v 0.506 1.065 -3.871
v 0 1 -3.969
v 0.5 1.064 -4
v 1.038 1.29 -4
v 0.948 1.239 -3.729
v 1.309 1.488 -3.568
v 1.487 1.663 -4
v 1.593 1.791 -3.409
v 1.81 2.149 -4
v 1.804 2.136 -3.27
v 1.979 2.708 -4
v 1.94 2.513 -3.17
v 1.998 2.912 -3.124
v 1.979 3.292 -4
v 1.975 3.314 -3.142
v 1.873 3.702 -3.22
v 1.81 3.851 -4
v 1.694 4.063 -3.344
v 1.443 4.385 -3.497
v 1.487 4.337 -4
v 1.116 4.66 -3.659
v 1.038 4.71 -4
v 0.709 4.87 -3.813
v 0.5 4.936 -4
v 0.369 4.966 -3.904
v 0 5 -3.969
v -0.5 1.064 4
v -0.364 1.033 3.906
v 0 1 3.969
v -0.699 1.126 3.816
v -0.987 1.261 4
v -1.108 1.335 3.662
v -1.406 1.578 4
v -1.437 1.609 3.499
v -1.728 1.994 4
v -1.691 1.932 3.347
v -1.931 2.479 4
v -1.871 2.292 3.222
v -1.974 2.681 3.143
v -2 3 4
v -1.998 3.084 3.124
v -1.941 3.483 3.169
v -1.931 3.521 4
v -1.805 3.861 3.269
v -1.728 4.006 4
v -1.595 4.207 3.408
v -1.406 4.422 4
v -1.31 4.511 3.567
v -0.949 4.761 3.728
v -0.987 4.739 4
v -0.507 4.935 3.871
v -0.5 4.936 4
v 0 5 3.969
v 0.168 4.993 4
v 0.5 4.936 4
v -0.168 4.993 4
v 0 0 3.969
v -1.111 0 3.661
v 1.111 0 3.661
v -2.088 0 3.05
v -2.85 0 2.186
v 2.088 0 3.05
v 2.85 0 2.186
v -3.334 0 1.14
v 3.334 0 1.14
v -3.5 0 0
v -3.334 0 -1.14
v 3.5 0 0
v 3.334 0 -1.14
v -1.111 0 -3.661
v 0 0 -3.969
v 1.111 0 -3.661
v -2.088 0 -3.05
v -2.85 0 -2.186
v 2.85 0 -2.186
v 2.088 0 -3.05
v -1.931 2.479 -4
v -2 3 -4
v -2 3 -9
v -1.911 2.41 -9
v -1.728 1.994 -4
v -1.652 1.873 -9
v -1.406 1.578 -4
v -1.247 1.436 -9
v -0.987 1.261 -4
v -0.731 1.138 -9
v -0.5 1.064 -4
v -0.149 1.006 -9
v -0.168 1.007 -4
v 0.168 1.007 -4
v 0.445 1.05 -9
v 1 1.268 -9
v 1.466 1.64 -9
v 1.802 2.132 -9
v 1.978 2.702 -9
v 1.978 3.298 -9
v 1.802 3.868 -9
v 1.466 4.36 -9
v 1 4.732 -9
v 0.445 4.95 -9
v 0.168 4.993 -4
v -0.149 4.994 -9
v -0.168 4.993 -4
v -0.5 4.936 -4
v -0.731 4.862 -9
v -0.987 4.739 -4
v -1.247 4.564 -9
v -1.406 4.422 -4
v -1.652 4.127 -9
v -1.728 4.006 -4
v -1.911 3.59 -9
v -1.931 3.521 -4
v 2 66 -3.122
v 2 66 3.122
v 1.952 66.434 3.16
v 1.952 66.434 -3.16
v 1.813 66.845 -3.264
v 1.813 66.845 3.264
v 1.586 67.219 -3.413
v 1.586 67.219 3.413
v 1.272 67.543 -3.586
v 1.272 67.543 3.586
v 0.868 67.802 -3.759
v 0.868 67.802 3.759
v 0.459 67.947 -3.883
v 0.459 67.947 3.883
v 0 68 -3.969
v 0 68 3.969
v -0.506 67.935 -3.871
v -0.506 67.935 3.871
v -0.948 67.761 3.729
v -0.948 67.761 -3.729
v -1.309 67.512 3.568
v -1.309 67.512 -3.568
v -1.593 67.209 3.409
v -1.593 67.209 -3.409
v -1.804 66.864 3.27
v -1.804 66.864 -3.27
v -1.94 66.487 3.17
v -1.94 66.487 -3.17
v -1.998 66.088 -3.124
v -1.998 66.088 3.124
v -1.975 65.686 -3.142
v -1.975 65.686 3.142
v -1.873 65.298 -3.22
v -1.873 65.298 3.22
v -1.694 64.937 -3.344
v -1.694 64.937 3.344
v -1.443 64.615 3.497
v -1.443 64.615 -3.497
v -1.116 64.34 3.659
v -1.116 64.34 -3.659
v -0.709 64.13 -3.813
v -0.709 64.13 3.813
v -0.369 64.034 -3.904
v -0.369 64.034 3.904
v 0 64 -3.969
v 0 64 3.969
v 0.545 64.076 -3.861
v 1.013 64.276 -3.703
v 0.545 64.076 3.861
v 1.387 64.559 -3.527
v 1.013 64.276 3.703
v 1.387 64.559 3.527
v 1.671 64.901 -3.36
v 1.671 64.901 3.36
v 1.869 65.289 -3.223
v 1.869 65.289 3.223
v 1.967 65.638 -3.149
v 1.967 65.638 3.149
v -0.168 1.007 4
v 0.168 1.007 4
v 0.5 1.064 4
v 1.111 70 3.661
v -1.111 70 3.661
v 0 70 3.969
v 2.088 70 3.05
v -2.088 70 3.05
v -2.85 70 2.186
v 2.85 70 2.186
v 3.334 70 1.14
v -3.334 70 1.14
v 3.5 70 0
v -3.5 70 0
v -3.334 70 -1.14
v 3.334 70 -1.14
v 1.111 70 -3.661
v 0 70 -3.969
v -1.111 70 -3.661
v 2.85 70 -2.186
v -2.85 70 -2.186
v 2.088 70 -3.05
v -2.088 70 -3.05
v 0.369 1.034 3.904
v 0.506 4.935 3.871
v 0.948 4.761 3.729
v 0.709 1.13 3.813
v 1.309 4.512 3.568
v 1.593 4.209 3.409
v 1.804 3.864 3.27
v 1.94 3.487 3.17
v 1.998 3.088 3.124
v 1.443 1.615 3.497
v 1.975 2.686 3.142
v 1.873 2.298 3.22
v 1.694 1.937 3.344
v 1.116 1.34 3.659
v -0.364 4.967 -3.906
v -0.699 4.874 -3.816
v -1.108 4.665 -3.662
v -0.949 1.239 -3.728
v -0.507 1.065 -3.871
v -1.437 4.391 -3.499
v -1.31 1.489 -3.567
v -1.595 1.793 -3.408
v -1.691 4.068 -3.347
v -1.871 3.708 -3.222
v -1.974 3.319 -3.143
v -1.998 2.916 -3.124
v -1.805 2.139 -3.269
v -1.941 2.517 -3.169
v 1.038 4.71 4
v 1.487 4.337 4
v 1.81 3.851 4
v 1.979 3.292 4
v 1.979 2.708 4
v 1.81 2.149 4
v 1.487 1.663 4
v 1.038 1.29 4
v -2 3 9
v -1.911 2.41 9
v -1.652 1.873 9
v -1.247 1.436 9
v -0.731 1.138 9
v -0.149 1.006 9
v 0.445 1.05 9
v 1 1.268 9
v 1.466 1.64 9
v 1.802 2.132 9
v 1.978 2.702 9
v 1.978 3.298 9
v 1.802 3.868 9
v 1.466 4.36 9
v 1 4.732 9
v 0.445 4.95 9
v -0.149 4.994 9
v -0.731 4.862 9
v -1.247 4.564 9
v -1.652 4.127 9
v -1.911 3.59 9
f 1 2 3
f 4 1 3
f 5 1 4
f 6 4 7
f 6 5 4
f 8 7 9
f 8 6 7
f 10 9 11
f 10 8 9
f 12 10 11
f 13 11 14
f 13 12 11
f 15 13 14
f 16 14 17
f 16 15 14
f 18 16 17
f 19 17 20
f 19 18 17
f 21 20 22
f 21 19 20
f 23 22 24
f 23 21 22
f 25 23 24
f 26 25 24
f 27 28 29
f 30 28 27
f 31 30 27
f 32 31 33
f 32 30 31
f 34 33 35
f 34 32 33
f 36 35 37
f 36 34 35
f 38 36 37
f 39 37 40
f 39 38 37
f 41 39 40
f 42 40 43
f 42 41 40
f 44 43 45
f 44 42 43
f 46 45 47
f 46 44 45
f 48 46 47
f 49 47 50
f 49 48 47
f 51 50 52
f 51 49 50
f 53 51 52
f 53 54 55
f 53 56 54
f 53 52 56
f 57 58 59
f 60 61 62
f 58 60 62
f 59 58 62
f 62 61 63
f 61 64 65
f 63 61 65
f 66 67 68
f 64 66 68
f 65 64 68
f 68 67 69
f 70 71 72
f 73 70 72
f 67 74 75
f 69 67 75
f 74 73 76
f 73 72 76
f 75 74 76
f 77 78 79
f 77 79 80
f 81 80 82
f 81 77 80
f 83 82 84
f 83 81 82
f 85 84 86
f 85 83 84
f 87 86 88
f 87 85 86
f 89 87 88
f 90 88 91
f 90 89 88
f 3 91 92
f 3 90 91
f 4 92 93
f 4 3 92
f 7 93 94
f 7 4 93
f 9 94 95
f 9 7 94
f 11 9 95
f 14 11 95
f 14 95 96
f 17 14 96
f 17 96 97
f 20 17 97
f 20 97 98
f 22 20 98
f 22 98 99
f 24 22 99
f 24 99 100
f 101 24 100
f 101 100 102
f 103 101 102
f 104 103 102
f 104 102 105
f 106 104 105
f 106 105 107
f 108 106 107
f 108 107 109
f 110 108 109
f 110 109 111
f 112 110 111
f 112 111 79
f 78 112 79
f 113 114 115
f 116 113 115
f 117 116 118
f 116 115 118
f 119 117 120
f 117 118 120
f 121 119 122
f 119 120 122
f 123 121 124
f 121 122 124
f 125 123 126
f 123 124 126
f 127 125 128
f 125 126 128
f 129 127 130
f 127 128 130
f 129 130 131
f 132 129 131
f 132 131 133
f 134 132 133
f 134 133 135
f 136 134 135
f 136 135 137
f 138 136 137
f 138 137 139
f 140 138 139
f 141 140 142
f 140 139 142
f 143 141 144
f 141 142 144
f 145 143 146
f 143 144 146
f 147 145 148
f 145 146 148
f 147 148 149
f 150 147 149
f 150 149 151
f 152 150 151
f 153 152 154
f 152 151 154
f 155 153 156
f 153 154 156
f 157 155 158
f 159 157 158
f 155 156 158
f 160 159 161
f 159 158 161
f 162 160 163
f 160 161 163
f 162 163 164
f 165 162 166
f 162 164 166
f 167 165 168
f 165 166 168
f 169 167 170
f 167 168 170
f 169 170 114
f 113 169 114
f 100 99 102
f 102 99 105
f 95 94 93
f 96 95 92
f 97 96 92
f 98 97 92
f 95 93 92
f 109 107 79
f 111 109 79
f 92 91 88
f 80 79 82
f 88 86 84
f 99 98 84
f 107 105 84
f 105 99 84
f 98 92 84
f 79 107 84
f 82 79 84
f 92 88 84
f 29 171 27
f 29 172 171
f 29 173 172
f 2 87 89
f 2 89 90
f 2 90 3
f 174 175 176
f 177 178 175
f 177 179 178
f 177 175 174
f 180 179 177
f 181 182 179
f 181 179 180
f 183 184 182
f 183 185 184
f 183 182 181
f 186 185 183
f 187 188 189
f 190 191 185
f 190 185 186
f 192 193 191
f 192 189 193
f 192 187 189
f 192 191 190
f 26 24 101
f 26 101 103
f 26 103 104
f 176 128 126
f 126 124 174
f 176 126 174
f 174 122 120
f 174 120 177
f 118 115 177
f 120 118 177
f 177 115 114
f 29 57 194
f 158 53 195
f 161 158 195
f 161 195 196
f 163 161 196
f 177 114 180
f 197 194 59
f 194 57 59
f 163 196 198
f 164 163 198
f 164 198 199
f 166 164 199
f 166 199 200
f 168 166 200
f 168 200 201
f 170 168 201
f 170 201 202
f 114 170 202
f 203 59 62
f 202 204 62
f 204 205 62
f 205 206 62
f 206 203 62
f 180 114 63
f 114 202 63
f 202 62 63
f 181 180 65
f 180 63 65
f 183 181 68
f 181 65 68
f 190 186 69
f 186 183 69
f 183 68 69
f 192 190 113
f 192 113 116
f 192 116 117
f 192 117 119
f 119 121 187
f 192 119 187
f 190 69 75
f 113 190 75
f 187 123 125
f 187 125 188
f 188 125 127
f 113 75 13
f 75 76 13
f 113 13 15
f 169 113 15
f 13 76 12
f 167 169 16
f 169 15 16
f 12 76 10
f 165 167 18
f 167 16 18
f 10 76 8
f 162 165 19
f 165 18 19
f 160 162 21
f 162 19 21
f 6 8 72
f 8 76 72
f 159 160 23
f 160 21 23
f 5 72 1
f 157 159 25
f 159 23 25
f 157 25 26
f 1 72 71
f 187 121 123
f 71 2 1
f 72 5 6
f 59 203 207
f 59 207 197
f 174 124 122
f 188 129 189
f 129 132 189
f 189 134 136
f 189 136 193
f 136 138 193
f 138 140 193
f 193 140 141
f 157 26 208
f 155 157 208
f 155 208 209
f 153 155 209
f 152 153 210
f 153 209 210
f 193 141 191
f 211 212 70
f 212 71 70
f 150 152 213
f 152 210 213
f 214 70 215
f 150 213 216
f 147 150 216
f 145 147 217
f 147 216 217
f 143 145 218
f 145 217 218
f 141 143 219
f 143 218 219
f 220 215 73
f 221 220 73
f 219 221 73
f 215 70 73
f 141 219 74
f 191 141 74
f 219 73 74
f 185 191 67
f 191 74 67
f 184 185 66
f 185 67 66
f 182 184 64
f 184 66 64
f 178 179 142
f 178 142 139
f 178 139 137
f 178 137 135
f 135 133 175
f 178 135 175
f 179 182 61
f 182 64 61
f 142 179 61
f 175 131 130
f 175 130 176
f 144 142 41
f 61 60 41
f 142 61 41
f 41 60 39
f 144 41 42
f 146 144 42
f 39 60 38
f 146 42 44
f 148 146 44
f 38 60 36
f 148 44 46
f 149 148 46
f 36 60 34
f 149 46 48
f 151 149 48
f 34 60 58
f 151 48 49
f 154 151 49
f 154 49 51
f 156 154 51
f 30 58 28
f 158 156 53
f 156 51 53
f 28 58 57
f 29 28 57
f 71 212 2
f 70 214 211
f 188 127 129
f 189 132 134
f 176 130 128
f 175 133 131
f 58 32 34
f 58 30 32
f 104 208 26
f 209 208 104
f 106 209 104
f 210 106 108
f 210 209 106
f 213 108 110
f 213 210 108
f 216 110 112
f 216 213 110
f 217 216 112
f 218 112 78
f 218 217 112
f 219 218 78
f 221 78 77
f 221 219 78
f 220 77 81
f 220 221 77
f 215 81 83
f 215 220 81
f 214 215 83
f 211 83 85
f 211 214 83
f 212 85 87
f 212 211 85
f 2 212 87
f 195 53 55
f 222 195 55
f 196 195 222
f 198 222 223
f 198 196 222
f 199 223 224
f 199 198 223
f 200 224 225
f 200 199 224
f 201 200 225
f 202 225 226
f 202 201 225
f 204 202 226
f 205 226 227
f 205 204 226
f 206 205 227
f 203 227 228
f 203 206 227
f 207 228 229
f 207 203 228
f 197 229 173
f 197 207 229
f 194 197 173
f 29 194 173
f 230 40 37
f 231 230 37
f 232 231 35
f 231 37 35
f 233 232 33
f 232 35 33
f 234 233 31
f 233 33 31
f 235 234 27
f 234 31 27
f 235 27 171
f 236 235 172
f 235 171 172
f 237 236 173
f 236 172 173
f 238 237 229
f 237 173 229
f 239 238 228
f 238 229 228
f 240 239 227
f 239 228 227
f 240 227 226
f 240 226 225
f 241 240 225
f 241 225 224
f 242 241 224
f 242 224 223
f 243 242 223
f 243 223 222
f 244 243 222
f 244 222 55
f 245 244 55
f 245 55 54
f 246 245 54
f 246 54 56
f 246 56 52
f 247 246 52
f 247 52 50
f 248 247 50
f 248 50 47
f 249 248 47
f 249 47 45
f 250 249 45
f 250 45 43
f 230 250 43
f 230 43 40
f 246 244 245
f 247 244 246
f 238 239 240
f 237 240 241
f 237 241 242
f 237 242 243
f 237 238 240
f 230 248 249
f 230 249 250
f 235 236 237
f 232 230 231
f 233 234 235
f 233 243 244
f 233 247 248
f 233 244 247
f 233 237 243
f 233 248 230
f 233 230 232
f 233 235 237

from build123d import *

# Parameters (mm, degrees)
SKETCH2_W           = 7
SKETCH2_H           = 8
BOSS_EXTRUDE1_DEPTH = 70
SKETCH3_R           = 2
BOSS_EXTRUDE2_DEPTH = 5
CUT_EXTRUDE1_REACH  = 73.283
SKETCH4_R           = 2
FILLET1_R           = 4


with BuildPart() as part:
    # Sketch2 → Boss-Extrude1 (new body)
    with BuildSketch(Plane(origin=(0, 0, 0), x_dir=(1, 0, 0), z_dir=(0, 1, 0))):
        Rectangle(SKETCH2_W, SKETCH2_H)
    extrude(amount=BOSS_EXTRUDE1_DEPTH)

    # Sketch3 → Boss-Extrude2 (add)
    with BuildSketch(Plane.XY.offset(4)):
        with Locations(Location((0, 3, 0), (0, 0, 180))):
            Circle(SKETCH3_R)
    boss_extrude2 = extrude(amount=BOSS_EXTRUDE2_DEPTH)

    # Mirror1: Boss-Extrude2 across plane
    add(boss_extrude2.mirror(Plane.XY))

    # Sketch4 → Cut-Extrude1 (cut, up to next)
    with BuildSketch(Plane.XY.offset(4), mode=Mode.PRIVATE) as cut_extrude1_sk1:
        with Locations((0, 66)):
            Circle(SKETCH4_R)
    cut_extrude1_tool1 = extrude(cut_extrude1_sk1.sketch, amount=-CUT_EXTRUDE1_REACH, mode=Mode.PRIVATE) & part.part
    add(cut_extrude1_tool1.solids().sort_by_distance((0, 66, 4))[0], mode=Mode.SUBTRACT)

    # Fillet1
    # the kernel refuses this fillet: 4 mm, written as the material it takes off along each edge
    with BuildSketch(Plane(origin=(-3.5, -10, 4), x_dir=(0, 0, -1), z_dir=(0, 1, 0))) as fillet1_piece_1_section:
        with BuildLine():
            CenterArc((FILLET1_R, -FILLET1_R), FILLET1_R, 90, 90)
            Line((0, -FILLET1_R), (0, 0))
            Line((0, 0), (FILLET1_R, 0))
        make_face()
    fillet1_piece_1 = extrude(amount=90, mode=Mode.PRIVATE)
    fillet1_piece_1 = fillet1_piece_1 - Plane(origin=(0, 3, 3.08936477), x_dir=(-1, 0, 0), z_dir=(0, 0, -1)) * Cylinder(2, 196, mode=Mode.PRIVATE)
    add(fillet1_piece_1, mode=Mode.SUBTRACT)
    with BuildSketch(Plane(origin=(-3.5, -10, -4), x_dir=(1, 0, 0), z_dir=(0, 1, 0))) as fillet1_piece_2_section:
        with BuildLine():
            CenterArc((FILLET1_R, -FILLET1_R), FILLET1_R, 90, 90)
            Line((0, -FILLET1_R), (0, 0))
            Line((0, 0), (FILLET1_R, 0))
        make_face()
    fillet1_piece_2 = extrude(amount=90, mode=Mode.PRIVATE)
    fillet1_piece_2 = fillet1_piece_2 - Plane(origin=(0, 3, -3.089364757), x_dir=(-1, 0, 0), z_dir=(0, 0, 1)) * Cylinder(2, 196, mode=Mode.PRIVATE)
    add(fillet1_piece_2, mode=Mode.SUBTRACT)
    with BuildSketch(Plane(origin=(3.5, -10, -4), x_dir=(-1, 0, 0), z_dir=(0, 1, 0))) as fillet1_piece_3_section:
        with BuildLine():
            CenterArc((FILLET1_R, FILLET1_R), FILLET1_R, 180, 90)
            Line((0, FILLET1_R), (0, 0))
            Line((0, 0), (FILLET1_R, 0))
        make_face()
    fillet1_piece_3 = extrude(amount=90, mode=Mode.PRIVATE)
    fillet1_piece_3 = fillet1_piece_3 - Plane(origin=(0, 3, -3.089364802), x_dir=(-1, 0, 0), z_dir=(0, 0, 1)) * Cylinder(2, 196, mode=Mode.PRIVATE)
    add(fillet1_piece_3, mode=Mode.SUBTRACT)
    with BuildSketch(Plane(origin=(3.5, -10, 4), x_dir=(0, 0, -1), z_dir=(0, 1, 0))) as fillet1_piece_4_section:
        with BuildLine():
            CenterArc((FILLET1_R, FILLET1_R), FILLET1_R, 180, 90)
            Line((0, FILLET1_R), (0, 0))
            Line((0, 0), (FILLET1_R, 0))
        make_face()
    fillet1_piece_4 = extrude(amount=90, mode=Mode.PRIVATE)
    fillet1_piece_4 = fillet1_piece_4 - Plane(origin=(0, 3, 3.089364961), x_dir=(-1, 0, 0), z_dir=(0, 0, -1)) * Cylinder(2, 196, mode=Mode.PRIVATE)
    add(fillet1_piece_4, mode=Mode.SUBTRACT)


solid = part.part
